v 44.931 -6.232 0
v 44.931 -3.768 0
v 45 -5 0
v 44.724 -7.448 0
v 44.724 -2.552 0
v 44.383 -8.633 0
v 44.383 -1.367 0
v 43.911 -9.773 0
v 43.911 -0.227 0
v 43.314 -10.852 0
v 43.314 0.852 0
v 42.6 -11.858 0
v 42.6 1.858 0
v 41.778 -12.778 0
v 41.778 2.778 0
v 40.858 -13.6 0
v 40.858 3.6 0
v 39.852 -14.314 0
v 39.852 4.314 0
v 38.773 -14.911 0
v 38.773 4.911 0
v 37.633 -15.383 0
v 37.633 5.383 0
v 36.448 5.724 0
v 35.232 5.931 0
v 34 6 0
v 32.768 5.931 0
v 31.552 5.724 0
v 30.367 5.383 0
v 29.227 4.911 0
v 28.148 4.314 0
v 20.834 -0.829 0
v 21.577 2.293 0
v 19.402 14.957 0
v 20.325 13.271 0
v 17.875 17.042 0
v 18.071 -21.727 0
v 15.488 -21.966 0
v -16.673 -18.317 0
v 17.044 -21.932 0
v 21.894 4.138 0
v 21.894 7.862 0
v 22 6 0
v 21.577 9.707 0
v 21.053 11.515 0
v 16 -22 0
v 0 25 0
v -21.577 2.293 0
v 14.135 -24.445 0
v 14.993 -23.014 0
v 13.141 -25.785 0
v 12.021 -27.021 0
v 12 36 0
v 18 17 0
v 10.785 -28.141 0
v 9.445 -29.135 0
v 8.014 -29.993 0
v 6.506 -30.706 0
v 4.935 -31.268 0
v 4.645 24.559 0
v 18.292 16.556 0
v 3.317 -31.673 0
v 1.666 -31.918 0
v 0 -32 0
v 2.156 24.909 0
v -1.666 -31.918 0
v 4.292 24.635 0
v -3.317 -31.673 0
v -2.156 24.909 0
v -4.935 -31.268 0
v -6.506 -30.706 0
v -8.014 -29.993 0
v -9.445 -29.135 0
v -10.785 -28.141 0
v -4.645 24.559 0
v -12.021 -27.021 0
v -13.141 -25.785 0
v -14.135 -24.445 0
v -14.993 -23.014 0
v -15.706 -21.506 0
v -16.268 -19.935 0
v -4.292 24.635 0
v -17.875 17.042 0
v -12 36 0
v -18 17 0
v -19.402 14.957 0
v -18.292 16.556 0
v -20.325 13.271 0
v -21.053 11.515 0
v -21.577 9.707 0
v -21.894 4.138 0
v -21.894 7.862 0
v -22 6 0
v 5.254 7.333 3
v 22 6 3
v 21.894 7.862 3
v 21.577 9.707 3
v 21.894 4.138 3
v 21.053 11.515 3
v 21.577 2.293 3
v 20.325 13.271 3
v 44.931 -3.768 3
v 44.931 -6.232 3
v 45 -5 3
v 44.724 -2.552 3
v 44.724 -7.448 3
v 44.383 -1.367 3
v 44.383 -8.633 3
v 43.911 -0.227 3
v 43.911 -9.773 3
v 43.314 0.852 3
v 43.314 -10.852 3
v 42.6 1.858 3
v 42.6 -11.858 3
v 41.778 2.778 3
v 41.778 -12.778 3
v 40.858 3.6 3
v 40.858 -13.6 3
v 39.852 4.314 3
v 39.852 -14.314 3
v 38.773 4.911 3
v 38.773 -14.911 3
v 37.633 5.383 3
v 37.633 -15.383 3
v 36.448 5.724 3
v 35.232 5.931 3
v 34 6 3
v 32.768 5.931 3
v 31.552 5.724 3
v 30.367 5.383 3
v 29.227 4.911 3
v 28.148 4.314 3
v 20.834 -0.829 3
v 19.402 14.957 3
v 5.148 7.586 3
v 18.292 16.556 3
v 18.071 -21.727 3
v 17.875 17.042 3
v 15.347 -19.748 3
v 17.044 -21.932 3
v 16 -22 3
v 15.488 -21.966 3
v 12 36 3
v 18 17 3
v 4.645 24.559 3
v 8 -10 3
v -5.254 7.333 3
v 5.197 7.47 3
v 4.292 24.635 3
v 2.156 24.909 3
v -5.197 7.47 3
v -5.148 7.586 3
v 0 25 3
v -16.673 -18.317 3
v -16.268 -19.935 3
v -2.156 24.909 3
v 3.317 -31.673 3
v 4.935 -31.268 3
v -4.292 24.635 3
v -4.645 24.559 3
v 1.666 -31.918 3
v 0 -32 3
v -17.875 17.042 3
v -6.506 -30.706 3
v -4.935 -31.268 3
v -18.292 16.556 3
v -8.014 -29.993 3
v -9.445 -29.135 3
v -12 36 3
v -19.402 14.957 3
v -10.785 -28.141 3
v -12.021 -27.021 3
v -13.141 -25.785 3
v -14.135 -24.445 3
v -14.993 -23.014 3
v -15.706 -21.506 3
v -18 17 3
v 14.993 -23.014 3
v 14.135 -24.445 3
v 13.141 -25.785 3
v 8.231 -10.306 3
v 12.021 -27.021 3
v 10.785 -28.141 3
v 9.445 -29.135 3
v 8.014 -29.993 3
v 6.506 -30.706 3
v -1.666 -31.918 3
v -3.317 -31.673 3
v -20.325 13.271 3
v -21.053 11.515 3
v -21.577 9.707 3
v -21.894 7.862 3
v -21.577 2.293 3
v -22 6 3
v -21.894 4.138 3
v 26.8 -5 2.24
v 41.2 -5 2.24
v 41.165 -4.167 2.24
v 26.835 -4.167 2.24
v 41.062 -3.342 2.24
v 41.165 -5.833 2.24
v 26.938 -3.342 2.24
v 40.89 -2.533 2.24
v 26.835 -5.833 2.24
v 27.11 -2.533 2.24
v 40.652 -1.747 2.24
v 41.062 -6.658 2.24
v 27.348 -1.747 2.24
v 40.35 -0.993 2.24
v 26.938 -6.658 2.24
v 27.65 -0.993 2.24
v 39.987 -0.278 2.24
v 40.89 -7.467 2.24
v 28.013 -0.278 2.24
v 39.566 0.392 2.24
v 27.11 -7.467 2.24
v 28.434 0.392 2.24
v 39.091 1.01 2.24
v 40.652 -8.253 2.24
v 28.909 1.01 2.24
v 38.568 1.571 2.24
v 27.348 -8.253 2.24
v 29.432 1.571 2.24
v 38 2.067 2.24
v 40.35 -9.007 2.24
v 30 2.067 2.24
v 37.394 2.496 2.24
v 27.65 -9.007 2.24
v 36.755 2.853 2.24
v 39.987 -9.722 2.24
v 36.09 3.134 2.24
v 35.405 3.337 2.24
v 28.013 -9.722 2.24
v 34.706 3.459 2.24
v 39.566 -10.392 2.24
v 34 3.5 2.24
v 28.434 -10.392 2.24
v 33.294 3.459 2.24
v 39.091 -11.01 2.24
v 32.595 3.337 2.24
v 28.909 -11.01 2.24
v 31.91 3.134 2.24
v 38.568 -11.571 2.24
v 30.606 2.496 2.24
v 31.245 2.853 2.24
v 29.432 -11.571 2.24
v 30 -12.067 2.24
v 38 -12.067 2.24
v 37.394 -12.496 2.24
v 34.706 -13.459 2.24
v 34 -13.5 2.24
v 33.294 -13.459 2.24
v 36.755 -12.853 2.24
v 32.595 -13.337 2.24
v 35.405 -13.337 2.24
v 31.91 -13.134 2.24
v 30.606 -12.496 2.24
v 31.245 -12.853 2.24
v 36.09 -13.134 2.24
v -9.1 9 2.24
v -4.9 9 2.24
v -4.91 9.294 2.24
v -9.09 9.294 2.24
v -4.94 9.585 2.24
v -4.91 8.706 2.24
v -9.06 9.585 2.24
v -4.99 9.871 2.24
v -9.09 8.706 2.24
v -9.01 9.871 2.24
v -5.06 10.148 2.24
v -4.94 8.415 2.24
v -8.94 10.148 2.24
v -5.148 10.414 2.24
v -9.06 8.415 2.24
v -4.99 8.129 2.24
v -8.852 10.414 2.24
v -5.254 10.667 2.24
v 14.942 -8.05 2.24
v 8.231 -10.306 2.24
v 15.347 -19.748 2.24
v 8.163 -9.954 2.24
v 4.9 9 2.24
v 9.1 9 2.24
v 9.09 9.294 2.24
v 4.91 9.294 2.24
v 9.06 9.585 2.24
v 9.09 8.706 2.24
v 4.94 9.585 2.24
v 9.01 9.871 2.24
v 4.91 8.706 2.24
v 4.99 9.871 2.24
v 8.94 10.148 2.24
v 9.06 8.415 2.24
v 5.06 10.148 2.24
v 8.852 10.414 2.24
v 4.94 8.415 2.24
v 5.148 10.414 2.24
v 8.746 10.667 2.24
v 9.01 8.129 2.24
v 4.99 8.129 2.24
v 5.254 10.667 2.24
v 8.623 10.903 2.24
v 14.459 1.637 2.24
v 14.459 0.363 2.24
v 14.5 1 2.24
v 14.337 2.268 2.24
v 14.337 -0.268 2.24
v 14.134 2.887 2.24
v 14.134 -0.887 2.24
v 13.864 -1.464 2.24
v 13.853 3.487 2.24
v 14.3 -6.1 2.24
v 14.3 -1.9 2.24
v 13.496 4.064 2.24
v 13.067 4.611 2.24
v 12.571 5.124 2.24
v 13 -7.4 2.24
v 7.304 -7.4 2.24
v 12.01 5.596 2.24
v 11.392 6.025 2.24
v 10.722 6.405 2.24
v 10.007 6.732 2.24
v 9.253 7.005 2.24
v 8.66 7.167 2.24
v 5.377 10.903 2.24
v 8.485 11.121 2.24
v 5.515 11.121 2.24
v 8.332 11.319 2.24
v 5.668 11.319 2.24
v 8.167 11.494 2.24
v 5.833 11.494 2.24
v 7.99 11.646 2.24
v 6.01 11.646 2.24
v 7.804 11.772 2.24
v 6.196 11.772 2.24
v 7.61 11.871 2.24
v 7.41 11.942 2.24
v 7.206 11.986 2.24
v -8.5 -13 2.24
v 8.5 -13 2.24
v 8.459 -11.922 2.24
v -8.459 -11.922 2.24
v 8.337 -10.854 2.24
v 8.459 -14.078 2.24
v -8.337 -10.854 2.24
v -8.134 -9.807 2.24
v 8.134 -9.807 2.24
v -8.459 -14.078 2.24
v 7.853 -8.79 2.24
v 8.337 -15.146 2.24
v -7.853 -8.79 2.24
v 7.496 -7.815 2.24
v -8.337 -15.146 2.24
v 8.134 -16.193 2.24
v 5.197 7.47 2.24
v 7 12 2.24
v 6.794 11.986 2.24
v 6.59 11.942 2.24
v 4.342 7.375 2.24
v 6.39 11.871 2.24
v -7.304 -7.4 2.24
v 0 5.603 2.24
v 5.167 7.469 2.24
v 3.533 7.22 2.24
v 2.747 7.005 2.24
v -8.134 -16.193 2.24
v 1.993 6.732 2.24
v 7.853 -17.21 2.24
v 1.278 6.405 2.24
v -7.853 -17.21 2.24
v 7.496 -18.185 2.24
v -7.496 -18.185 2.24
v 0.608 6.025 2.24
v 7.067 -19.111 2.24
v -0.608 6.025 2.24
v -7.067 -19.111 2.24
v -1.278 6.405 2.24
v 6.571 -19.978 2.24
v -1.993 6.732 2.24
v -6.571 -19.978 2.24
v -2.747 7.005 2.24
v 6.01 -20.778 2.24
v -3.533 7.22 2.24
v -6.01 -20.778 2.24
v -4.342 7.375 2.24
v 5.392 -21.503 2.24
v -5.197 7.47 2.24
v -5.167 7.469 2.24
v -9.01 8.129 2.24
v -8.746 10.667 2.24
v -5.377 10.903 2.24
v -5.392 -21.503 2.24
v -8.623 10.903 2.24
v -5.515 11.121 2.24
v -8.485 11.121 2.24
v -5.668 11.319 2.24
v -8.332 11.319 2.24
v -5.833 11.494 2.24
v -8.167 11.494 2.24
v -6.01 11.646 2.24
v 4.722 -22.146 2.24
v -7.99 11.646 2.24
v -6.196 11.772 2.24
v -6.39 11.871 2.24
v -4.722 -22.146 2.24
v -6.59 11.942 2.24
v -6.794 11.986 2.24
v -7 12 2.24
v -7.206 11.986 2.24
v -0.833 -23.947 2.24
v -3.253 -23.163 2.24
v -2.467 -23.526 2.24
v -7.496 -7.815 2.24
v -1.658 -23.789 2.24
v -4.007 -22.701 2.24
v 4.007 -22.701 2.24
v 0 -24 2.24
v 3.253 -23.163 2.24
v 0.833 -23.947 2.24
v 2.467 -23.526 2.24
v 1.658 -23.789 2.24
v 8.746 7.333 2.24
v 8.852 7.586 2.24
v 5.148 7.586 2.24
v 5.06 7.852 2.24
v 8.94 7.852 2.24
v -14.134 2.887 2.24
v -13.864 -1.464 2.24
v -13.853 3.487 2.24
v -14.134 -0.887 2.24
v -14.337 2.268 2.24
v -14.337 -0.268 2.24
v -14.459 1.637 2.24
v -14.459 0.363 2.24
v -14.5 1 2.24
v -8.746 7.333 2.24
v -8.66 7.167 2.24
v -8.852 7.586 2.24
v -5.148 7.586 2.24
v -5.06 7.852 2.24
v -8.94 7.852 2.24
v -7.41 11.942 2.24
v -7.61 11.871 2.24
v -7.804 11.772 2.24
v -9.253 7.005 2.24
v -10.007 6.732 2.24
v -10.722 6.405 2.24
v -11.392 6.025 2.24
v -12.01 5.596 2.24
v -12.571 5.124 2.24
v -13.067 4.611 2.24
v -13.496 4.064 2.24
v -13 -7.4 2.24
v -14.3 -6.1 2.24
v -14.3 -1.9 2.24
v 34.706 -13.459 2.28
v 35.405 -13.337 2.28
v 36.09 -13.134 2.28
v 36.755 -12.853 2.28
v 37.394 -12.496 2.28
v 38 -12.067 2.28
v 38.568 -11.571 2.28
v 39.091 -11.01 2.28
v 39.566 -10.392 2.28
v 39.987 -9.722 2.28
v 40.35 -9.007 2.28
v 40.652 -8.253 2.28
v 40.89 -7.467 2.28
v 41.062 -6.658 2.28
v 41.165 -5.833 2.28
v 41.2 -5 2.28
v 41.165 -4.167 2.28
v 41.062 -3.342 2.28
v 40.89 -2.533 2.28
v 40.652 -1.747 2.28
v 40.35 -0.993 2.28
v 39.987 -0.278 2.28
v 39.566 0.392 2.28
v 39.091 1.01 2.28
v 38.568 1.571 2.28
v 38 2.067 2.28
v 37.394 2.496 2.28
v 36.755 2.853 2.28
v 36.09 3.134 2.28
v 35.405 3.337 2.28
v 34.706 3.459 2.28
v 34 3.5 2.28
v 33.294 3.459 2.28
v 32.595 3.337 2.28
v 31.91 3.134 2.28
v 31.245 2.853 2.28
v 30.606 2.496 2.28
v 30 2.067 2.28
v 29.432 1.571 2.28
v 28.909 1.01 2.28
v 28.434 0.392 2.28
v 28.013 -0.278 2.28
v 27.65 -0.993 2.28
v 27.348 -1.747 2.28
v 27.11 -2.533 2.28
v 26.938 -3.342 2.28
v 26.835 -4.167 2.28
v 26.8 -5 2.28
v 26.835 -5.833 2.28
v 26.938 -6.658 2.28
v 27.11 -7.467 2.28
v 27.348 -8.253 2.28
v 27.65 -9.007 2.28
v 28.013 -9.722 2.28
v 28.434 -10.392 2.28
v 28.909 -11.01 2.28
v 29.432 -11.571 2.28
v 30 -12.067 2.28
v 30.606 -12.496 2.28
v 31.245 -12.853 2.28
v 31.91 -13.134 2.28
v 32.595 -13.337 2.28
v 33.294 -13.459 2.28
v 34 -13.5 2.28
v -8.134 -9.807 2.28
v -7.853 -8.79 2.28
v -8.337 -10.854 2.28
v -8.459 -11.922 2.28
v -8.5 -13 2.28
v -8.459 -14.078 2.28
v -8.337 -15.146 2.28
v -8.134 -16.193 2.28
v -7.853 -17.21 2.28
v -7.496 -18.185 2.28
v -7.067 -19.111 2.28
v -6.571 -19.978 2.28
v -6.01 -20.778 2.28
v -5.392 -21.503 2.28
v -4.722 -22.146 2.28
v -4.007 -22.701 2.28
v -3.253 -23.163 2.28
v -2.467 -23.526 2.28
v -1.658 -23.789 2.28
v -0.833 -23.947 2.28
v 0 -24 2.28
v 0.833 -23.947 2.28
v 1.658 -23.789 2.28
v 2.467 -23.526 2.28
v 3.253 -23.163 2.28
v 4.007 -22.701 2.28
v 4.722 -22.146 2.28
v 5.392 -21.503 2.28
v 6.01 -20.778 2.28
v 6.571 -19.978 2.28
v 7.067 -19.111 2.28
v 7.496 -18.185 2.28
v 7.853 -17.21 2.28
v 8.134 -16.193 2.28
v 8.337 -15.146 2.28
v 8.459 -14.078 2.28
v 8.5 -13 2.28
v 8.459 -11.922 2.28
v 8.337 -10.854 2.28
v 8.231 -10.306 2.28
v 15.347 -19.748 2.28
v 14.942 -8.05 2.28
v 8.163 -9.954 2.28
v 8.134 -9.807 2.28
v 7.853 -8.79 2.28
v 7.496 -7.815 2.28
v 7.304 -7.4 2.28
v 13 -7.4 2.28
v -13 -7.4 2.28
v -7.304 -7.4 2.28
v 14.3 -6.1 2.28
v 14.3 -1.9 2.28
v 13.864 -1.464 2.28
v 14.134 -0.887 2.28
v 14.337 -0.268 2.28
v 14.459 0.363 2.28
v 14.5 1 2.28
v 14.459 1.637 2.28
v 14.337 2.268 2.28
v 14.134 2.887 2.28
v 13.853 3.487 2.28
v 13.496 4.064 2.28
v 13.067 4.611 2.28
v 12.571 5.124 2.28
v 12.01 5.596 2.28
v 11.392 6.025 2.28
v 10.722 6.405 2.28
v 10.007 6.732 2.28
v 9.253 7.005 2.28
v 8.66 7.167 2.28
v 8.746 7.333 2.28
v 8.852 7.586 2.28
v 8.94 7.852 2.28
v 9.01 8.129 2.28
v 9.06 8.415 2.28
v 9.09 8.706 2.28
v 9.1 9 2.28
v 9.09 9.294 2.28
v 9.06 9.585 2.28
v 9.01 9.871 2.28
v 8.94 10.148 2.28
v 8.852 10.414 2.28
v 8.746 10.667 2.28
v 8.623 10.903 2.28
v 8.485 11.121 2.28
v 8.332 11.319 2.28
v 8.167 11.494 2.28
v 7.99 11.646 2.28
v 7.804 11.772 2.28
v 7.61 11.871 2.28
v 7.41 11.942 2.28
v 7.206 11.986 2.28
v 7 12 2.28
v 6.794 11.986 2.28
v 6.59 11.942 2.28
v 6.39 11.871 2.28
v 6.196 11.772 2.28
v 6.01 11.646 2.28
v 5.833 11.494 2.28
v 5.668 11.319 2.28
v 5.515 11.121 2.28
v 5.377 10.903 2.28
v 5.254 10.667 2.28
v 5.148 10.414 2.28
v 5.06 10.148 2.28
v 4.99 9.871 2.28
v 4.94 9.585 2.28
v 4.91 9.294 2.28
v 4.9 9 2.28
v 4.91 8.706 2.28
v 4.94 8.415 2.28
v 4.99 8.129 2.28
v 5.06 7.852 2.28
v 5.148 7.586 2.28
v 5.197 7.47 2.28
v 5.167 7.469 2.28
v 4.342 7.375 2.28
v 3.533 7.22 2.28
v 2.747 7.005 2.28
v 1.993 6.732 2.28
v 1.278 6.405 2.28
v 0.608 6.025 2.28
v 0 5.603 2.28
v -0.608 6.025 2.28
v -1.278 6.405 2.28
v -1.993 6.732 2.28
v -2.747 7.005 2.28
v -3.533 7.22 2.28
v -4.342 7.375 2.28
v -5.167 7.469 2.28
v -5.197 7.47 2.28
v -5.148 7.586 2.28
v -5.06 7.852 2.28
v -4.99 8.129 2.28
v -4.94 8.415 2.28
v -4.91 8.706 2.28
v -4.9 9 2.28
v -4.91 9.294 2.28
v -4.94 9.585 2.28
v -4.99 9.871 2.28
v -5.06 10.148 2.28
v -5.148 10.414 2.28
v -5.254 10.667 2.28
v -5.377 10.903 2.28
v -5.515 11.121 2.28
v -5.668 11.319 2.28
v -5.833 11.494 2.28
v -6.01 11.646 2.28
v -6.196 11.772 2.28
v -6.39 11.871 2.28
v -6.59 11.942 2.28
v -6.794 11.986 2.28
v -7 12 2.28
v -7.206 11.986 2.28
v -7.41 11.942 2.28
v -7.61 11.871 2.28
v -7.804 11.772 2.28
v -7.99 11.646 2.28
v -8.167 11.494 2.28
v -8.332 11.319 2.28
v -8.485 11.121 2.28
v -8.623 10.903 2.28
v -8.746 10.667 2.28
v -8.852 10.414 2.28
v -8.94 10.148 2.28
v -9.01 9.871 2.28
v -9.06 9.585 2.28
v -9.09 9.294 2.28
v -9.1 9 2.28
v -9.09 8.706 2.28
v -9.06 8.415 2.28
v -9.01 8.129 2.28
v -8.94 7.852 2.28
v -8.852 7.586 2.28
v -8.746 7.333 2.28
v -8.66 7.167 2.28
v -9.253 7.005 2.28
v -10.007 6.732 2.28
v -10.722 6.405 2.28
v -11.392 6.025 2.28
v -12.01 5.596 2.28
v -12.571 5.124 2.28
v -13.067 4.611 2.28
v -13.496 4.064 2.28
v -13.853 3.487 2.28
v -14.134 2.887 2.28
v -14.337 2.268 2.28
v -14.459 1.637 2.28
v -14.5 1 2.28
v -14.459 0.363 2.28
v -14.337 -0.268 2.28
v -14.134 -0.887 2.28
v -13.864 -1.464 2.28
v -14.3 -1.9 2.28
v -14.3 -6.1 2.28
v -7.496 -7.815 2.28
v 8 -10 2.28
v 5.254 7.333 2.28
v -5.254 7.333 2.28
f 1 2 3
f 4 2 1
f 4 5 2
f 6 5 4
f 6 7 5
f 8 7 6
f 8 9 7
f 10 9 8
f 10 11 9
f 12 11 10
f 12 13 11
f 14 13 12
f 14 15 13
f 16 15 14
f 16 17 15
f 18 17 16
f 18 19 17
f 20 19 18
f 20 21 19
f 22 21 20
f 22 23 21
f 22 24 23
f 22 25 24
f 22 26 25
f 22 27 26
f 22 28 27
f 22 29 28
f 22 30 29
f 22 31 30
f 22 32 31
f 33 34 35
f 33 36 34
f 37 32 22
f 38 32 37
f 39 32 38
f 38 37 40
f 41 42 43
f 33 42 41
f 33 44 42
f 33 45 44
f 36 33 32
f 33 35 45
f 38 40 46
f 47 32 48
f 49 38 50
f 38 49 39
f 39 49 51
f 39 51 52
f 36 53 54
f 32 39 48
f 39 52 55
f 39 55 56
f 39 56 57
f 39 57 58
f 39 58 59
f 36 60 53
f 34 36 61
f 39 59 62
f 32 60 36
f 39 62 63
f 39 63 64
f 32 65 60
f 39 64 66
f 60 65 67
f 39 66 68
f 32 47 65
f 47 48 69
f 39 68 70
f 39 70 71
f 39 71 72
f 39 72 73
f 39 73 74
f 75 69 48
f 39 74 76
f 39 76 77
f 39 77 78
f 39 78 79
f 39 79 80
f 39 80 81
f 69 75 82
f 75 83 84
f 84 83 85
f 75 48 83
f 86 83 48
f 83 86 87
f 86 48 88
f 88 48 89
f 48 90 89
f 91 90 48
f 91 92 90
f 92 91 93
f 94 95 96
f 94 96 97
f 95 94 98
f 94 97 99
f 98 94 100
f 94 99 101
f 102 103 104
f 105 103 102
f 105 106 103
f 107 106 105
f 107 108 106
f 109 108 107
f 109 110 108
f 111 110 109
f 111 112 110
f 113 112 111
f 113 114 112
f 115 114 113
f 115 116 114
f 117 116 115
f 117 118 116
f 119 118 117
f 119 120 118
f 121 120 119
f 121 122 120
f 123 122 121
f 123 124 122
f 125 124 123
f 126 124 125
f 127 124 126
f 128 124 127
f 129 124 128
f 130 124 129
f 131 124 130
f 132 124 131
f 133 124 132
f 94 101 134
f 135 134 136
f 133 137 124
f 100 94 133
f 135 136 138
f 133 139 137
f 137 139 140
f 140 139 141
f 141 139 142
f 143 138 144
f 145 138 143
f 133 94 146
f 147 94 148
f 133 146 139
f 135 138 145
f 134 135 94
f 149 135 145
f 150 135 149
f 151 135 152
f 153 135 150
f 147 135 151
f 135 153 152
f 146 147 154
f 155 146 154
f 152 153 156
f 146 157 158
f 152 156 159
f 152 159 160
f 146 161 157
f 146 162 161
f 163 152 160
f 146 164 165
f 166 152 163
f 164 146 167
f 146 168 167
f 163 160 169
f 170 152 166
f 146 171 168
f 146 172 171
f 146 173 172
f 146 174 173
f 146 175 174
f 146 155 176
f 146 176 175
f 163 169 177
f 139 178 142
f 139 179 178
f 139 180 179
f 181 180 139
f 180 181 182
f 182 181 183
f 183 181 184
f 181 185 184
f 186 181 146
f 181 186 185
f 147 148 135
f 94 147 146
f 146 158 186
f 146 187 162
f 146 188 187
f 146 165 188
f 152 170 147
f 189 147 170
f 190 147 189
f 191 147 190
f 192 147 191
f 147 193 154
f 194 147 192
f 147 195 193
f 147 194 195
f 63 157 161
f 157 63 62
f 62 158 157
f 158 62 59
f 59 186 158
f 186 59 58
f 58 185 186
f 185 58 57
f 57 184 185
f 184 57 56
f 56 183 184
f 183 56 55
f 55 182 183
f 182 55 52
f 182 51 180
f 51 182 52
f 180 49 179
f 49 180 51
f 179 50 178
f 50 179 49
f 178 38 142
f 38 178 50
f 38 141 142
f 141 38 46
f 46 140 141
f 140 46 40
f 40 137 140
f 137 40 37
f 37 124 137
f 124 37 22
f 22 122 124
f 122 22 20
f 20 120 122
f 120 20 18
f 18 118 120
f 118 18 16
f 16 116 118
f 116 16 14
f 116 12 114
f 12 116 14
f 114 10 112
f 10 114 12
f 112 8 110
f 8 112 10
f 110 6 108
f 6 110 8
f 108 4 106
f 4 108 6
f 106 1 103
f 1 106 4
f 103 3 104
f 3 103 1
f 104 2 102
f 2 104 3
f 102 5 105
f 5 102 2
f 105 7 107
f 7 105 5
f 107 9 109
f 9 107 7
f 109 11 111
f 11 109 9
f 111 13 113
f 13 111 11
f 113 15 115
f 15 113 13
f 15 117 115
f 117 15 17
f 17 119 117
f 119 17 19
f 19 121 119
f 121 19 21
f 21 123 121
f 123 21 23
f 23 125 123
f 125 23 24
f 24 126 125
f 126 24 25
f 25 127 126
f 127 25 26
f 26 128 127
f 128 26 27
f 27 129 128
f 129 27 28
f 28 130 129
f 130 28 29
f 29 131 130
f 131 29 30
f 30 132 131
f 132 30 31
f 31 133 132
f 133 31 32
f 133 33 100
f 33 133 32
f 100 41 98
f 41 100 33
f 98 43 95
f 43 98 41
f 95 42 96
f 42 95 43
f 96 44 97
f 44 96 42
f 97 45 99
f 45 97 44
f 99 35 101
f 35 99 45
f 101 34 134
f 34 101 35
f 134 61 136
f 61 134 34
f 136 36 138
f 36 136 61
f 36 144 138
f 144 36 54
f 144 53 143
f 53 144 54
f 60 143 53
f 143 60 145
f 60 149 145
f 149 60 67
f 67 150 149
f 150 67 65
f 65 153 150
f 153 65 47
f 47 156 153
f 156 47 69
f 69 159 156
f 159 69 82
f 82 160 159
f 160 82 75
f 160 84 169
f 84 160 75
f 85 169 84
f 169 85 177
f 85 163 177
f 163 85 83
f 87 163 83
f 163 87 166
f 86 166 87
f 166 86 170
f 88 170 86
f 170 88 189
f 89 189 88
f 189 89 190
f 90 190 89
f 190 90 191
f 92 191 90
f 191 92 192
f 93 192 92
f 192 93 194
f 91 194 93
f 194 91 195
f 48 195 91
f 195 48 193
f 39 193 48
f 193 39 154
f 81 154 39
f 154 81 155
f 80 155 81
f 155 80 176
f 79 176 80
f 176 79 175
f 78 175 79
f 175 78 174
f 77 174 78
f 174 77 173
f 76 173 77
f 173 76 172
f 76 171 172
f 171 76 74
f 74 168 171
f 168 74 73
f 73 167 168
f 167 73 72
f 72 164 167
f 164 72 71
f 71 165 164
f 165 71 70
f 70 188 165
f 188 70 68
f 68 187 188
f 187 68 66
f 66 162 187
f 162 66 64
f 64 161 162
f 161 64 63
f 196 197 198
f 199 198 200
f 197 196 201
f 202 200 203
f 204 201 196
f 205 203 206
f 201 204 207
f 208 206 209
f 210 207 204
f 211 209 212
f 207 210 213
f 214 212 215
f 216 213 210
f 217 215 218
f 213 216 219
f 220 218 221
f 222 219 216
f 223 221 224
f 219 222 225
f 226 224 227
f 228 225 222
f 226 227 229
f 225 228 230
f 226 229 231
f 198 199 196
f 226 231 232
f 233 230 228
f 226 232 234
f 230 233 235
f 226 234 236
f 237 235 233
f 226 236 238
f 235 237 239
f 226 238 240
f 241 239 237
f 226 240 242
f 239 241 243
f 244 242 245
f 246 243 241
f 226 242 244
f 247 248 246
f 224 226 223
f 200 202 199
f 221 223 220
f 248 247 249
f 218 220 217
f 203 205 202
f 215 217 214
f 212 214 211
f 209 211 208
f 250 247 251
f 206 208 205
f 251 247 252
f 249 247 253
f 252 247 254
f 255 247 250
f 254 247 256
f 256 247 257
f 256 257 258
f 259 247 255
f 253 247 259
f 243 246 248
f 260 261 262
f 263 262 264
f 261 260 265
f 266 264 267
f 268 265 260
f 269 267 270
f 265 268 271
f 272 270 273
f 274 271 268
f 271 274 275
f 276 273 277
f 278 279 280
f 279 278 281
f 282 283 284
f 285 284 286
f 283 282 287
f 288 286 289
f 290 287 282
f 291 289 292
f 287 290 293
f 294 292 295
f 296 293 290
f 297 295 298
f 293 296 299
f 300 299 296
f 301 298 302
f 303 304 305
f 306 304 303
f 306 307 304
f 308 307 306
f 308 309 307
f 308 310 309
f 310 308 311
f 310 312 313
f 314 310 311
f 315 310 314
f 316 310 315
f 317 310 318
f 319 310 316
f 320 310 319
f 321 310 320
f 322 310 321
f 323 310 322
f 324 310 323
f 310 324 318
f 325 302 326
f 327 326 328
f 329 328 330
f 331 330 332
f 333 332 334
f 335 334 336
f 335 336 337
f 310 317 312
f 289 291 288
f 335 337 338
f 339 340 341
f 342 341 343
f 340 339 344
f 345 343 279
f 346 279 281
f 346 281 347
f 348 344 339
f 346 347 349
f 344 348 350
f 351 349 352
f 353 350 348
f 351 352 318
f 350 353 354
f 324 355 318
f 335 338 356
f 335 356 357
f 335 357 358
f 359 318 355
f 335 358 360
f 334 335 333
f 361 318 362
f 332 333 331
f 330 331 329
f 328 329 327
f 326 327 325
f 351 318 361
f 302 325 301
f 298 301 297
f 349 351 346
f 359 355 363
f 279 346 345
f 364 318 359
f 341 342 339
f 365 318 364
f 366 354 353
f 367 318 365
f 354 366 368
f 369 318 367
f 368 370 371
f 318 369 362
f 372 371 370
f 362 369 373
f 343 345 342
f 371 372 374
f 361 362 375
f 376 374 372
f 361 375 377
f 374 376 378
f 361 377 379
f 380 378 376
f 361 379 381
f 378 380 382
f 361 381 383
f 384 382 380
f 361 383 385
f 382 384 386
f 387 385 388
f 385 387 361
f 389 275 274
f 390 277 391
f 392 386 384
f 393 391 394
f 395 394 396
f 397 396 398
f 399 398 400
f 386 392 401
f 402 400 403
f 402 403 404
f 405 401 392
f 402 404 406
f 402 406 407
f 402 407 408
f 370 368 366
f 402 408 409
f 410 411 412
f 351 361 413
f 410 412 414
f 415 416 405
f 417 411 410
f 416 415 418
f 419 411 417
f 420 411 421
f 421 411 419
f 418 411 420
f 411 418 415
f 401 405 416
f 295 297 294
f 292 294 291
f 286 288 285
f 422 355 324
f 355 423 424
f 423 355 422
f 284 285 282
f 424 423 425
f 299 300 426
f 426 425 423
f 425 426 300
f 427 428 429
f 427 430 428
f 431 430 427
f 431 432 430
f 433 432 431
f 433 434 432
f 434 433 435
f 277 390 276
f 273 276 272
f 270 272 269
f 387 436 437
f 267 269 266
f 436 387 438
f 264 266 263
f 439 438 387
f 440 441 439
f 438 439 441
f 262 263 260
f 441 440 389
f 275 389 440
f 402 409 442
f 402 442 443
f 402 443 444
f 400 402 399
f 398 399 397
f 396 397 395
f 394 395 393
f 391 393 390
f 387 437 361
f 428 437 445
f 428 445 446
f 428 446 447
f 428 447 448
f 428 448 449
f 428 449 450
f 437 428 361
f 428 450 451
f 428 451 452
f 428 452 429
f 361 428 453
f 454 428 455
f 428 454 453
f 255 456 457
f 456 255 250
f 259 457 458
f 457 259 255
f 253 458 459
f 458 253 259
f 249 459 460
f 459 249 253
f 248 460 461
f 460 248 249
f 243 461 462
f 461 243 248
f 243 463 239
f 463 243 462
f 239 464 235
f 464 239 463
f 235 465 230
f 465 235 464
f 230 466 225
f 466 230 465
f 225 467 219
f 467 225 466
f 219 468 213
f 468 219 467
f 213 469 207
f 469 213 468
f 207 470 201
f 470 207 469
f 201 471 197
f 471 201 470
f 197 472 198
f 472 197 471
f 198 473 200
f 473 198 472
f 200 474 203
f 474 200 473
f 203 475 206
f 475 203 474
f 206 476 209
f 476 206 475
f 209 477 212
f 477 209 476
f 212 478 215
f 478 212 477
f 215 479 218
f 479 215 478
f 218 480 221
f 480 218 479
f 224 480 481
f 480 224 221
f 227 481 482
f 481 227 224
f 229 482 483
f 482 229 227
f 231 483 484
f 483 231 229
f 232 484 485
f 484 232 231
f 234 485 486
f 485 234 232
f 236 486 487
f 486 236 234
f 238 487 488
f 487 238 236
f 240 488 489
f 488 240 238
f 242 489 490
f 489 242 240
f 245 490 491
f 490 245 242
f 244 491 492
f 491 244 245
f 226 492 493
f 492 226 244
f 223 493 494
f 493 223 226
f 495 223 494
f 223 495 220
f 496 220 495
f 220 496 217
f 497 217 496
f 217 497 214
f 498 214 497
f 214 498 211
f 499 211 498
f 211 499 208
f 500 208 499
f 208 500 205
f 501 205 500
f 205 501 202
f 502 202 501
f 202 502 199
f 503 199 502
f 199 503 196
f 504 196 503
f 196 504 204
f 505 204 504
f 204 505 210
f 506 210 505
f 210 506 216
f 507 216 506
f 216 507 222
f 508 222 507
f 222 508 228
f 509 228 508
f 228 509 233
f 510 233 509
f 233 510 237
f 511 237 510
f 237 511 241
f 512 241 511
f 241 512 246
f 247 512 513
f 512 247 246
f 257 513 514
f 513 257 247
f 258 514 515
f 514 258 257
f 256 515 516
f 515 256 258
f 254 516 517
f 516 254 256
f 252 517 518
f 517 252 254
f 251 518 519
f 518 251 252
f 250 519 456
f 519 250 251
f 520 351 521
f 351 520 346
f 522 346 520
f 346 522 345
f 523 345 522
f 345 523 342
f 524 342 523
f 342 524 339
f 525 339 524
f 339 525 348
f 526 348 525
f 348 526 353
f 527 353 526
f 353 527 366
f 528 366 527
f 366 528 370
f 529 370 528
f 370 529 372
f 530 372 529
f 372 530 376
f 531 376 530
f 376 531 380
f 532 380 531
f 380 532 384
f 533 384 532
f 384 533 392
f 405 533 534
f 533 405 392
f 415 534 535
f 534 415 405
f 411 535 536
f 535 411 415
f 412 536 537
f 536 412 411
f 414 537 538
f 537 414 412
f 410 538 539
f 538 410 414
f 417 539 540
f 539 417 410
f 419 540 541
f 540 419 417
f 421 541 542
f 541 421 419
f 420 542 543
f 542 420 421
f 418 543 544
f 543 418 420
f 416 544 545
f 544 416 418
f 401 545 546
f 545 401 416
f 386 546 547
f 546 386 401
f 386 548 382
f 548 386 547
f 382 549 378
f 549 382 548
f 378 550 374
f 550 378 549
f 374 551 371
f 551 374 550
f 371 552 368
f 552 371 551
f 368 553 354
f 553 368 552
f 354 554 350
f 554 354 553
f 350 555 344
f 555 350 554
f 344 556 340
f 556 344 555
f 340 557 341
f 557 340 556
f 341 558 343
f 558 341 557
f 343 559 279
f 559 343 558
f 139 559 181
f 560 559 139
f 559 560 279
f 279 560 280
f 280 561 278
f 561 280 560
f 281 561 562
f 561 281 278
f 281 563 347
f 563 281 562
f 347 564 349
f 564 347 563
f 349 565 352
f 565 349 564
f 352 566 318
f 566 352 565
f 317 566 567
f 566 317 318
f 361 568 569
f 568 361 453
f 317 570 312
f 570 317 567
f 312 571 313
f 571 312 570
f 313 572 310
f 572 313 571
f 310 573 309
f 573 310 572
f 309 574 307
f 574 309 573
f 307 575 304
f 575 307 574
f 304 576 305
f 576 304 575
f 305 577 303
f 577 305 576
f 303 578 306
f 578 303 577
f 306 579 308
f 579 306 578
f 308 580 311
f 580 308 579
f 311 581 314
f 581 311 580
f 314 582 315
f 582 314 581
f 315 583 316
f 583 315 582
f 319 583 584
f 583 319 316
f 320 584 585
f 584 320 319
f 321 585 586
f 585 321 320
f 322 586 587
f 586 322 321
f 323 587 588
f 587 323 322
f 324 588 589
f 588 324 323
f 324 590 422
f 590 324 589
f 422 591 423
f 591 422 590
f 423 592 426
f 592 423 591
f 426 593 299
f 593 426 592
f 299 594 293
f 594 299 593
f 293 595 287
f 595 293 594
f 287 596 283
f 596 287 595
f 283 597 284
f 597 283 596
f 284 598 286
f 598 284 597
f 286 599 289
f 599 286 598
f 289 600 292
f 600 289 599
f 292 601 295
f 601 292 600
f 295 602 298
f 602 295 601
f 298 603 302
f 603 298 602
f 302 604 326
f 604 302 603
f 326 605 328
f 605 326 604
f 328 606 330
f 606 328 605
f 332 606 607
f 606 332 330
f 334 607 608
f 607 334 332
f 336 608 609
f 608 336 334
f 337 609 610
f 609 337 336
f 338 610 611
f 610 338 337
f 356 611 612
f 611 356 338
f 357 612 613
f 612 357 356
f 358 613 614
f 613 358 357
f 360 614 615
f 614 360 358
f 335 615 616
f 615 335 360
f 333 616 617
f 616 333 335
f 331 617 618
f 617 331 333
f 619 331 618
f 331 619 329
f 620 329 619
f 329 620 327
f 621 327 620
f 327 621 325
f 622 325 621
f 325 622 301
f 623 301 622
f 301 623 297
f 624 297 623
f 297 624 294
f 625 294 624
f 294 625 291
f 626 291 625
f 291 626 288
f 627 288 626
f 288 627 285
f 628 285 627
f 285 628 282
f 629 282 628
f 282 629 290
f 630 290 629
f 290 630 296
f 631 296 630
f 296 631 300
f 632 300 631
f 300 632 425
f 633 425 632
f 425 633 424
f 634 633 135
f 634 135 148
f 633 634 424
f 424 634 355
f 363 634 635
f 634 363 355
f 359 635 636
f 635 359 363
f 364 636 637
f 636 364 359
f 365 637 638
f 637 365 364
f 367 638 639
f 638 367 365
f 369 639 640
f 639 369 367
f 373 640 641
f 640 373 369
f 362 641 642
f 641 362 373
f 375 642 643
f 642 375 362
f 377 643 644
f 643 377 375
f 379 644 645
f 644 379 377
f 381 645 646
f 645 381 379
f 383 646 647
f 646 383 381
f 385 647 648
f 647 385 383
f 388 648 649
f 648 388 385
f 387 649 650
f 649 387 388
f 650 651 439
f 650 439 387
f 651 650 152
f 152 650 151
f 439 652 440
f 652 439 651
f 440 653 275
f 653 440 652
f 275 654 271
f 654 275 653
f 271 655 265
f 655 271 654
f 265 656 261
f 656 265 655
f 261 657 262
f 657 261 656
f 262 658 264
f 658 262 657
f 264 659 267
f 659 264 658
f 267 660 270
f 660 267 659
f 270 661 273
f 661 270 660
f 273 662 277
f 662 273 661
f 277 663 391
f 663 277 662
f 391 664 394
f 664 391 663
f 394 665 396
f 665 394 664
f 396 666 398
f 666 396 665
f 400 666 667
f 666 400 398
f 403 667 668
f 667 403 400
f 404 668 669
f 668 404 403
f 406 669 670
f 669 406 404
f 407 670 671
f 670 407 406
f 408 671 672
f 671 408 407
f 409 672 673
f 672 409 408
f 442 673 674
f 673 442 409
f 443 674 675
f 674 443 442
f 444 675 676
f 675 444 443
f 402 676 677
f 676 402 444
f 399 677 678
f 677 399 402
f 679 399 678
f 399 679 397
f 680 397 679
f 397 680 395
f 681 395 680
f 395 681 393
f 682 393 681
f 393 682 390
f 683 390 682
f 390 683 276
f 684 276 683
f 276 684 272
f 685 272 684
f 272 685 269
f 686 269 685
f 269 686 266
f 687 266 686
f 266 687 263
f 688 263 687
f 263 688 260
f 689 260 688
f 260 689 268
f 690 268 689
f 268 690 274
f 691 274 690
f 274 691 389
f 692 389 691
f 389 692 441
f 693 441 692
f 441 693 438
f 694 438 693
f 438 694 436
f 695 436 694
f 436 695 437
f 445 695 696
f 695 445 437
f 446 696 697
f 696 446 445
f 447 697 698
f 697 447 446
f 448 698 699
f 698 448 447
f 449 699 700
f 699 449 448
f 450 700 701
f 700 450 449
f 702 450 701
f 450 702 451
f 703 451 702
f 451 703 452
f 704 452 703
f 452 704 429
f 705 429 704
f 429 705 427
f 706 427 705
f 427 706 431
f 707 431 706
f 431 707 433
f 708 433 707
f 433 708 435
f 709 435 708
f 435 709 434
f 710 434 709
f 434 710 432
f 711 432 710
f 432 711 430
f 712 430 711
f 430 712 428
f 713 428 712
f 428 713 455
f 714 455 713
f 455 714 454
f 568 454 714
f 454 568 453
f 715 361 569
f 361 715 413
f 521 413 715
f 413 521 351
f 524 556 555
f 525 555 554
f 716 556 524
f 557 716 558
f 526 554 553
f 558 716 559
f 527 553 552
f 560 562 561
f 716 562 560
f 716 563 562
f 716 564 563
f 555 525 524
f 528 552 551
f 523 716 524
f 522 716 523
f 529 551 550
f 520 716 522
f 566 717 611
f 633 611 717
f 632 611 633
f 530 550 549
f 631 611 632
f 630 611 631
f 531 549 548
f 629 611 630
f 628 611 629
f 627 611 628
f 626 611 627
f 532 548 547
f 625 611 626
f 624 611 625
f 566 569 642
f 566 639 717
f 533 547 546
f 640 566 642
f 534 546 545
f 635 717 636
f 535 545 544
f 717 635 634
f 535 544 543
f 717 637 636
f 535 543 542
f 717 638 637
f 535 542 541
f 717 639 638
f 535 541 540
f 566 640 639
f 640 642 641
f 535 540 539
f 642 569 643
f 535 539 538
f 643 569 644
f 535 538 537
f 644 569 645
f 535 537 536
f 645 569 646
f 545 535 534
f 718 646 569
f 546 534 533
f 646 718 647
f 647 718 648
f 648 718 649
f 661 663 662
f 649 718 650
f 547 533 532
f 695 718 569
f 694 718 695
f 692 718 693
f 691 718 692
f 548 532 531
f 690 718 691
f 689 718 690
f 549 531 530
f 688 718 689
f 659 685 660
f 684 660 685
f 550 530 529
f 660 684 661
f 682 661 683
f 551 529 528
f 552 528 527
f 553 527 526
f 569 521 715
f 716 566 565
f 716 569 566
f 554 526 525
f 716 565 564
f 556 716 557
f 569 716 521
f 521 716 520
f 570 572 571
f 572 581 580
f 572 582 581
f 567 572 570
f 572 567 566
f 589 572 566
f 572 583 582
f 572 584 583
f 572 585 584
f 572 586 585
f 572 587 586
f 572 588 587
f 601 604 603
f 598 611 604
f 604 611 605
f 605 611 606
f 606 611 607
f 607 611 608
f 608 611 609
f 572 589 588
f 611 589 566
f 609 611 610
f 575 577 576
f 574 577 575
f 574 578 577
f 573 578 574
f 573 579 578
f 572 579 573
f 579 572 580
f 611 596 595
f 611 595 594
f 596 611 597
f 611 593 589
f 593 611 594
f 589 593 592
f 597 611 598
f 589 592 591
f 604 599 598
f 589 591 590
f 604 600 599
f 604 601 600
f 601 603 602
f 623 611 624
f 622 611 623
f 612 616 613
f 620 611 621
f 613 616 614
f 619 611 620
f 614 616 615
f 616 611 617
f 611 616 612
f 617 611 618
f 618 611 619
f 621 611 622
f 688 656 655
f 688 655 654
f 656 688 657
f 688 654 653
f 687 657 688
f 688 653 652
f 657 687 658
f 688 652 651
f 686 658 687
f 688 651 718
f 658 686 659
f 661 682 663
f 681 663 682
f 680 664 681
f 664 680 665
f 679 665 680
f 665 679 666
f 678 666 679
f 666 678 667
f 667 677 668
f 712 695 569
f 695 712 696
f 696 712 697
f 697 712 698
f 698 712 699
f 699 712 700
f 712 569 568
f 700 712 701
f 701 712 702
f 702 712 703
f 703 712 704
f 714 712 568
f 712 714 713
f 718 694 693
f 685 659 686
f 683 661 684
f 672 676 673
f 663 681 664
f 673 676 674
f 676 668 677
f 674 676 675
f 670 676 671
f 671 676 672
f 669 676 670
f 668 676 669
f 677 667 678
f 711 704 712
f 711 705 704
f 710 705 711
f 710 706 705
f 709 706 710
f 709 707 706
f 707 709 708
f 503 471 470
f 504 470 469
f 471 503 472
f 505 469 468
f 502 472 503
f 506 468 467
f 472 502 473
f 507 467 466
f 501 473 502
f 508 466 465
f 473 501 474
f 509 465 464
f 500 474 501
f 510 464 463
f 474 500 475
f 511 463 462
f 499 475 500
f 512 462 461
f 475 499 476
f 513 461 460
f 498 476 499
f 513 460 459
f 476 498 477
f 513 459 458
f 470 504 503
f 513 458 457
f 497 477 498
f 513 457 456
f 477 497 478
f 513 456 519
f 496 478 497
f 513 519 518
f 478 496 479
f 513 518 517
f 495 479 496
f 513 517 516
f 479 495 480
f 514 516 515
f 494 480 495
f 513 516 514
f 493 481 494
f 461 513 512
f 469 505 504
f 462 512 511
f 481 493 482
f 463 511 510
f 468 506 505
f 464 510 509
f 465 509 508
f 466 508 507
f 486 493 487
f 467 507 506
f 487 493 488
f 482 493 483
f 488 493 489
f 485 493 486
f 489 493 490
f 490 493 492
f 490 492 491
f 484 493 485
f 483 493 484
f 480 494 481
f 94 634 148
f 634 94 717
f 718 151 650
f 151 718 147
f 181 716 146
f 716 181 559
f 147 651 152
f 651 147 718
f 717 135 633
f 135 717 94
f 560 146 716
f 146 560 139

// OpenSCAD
// Four-color fox badge with semantic top inlays.
part = "all";
plate_t = 3.0;
inlay_depth = 0.72;
eps = 0.04;

module ellipse(rx, ry) { scale([rx, ry]) circle(r=1, $fn=64); }
module fox_silhouette_2d() {
    union() {
        hull() {
            translate([0,6]) ellipse(22,19);
            translate([0,-15]) ellipse(17,17);
        }
        polygon(points=[[-18,17],[-12,36],[-3,22]]);
        polygon(points=[[18,17],[12,36],[3,22]]);
        hull() { translate([16,-14]) circle(r=8,$fn=48); translate([34,-5]) circle(r=11,$fn=56); }
    }
}
module black_raw_2d() {
    translate([-7,9]) ellipse(2.1,3.0);
    translate([7,9]) ellipse(2.1,3.0);
    translate([0,0]) polygon(points=[[-2.6,1.5],[2.6,1.5],[0,-2.5]]);
}
module white_raw_2d() {
    union() {
        translate([-6,1]) ellipse(8.5,6.5);
        translate([6,1]) ellipse(8.5,6.5);
        translate([0,-13]) ellipse(8.5,11);
        translate([34,-5]) ellipse(7.2,8.5);
    }
}
module blue_raw_2d() {
    union() {
        translate([0,-4]) offset(r=1.3) square([26,4.2],center=true);
        translate([8,-10]) rotate(-18) polygon(points=[[0,0],[10,-7],[6,4]]);
    }
}
module white_2d() { intersection() { fox_silhouette_2d(); difference(){ white_raw_2d(); black_raw_2d(); blue_raw_2d(); } } }
module black_2d() { intersection() { fox_silhouette_2d(); black_raw_2d(); } }
module blue_2d() { intersection() { fox_silhouette_2d(); difference(){ blue_raw_2d(); black_raw_2d(); } } }
module all_accents_2d() { union() { white_2d(); black_2d(); blue_2d(); } }

module color_volume(which="white", cutter=false) {
    z0=plate_t-inlay_depth-(cutter?eps:0);
    hh=inlay_depth+(cutter?2*eps:0);
    translate([0,0,z0]) linear_extrude(height=hh) {
        if(which=="white") white_2d();
        if(which=="black") black_2d();
        if(which=="blue") blue_2d();
    }
}
module base() {
    difference() {
        linear_extrude(height=plate_t) fox_silhouette_2d();
        translate([0,0,plate_t-inlay_depth-eps]) linear_extrude(height=inlay_depth+2*eps) all_accents_2d();
    }
}
module white_part(){color_volume("white",false);}
module black_part(){color_volume("black",false);}
module blue_part(){color_volume("blue",false);}

if(part=="base") base();
else if(part=="white") white_part();
else if(part=="black") black_part();
else if(part=="blue") blue_part();
else {
    color("#F26A21") base();
    color("#F2F0E8") white_part();
    color("#181818") black_part();
    color("#2979C7") blue_part();
}
